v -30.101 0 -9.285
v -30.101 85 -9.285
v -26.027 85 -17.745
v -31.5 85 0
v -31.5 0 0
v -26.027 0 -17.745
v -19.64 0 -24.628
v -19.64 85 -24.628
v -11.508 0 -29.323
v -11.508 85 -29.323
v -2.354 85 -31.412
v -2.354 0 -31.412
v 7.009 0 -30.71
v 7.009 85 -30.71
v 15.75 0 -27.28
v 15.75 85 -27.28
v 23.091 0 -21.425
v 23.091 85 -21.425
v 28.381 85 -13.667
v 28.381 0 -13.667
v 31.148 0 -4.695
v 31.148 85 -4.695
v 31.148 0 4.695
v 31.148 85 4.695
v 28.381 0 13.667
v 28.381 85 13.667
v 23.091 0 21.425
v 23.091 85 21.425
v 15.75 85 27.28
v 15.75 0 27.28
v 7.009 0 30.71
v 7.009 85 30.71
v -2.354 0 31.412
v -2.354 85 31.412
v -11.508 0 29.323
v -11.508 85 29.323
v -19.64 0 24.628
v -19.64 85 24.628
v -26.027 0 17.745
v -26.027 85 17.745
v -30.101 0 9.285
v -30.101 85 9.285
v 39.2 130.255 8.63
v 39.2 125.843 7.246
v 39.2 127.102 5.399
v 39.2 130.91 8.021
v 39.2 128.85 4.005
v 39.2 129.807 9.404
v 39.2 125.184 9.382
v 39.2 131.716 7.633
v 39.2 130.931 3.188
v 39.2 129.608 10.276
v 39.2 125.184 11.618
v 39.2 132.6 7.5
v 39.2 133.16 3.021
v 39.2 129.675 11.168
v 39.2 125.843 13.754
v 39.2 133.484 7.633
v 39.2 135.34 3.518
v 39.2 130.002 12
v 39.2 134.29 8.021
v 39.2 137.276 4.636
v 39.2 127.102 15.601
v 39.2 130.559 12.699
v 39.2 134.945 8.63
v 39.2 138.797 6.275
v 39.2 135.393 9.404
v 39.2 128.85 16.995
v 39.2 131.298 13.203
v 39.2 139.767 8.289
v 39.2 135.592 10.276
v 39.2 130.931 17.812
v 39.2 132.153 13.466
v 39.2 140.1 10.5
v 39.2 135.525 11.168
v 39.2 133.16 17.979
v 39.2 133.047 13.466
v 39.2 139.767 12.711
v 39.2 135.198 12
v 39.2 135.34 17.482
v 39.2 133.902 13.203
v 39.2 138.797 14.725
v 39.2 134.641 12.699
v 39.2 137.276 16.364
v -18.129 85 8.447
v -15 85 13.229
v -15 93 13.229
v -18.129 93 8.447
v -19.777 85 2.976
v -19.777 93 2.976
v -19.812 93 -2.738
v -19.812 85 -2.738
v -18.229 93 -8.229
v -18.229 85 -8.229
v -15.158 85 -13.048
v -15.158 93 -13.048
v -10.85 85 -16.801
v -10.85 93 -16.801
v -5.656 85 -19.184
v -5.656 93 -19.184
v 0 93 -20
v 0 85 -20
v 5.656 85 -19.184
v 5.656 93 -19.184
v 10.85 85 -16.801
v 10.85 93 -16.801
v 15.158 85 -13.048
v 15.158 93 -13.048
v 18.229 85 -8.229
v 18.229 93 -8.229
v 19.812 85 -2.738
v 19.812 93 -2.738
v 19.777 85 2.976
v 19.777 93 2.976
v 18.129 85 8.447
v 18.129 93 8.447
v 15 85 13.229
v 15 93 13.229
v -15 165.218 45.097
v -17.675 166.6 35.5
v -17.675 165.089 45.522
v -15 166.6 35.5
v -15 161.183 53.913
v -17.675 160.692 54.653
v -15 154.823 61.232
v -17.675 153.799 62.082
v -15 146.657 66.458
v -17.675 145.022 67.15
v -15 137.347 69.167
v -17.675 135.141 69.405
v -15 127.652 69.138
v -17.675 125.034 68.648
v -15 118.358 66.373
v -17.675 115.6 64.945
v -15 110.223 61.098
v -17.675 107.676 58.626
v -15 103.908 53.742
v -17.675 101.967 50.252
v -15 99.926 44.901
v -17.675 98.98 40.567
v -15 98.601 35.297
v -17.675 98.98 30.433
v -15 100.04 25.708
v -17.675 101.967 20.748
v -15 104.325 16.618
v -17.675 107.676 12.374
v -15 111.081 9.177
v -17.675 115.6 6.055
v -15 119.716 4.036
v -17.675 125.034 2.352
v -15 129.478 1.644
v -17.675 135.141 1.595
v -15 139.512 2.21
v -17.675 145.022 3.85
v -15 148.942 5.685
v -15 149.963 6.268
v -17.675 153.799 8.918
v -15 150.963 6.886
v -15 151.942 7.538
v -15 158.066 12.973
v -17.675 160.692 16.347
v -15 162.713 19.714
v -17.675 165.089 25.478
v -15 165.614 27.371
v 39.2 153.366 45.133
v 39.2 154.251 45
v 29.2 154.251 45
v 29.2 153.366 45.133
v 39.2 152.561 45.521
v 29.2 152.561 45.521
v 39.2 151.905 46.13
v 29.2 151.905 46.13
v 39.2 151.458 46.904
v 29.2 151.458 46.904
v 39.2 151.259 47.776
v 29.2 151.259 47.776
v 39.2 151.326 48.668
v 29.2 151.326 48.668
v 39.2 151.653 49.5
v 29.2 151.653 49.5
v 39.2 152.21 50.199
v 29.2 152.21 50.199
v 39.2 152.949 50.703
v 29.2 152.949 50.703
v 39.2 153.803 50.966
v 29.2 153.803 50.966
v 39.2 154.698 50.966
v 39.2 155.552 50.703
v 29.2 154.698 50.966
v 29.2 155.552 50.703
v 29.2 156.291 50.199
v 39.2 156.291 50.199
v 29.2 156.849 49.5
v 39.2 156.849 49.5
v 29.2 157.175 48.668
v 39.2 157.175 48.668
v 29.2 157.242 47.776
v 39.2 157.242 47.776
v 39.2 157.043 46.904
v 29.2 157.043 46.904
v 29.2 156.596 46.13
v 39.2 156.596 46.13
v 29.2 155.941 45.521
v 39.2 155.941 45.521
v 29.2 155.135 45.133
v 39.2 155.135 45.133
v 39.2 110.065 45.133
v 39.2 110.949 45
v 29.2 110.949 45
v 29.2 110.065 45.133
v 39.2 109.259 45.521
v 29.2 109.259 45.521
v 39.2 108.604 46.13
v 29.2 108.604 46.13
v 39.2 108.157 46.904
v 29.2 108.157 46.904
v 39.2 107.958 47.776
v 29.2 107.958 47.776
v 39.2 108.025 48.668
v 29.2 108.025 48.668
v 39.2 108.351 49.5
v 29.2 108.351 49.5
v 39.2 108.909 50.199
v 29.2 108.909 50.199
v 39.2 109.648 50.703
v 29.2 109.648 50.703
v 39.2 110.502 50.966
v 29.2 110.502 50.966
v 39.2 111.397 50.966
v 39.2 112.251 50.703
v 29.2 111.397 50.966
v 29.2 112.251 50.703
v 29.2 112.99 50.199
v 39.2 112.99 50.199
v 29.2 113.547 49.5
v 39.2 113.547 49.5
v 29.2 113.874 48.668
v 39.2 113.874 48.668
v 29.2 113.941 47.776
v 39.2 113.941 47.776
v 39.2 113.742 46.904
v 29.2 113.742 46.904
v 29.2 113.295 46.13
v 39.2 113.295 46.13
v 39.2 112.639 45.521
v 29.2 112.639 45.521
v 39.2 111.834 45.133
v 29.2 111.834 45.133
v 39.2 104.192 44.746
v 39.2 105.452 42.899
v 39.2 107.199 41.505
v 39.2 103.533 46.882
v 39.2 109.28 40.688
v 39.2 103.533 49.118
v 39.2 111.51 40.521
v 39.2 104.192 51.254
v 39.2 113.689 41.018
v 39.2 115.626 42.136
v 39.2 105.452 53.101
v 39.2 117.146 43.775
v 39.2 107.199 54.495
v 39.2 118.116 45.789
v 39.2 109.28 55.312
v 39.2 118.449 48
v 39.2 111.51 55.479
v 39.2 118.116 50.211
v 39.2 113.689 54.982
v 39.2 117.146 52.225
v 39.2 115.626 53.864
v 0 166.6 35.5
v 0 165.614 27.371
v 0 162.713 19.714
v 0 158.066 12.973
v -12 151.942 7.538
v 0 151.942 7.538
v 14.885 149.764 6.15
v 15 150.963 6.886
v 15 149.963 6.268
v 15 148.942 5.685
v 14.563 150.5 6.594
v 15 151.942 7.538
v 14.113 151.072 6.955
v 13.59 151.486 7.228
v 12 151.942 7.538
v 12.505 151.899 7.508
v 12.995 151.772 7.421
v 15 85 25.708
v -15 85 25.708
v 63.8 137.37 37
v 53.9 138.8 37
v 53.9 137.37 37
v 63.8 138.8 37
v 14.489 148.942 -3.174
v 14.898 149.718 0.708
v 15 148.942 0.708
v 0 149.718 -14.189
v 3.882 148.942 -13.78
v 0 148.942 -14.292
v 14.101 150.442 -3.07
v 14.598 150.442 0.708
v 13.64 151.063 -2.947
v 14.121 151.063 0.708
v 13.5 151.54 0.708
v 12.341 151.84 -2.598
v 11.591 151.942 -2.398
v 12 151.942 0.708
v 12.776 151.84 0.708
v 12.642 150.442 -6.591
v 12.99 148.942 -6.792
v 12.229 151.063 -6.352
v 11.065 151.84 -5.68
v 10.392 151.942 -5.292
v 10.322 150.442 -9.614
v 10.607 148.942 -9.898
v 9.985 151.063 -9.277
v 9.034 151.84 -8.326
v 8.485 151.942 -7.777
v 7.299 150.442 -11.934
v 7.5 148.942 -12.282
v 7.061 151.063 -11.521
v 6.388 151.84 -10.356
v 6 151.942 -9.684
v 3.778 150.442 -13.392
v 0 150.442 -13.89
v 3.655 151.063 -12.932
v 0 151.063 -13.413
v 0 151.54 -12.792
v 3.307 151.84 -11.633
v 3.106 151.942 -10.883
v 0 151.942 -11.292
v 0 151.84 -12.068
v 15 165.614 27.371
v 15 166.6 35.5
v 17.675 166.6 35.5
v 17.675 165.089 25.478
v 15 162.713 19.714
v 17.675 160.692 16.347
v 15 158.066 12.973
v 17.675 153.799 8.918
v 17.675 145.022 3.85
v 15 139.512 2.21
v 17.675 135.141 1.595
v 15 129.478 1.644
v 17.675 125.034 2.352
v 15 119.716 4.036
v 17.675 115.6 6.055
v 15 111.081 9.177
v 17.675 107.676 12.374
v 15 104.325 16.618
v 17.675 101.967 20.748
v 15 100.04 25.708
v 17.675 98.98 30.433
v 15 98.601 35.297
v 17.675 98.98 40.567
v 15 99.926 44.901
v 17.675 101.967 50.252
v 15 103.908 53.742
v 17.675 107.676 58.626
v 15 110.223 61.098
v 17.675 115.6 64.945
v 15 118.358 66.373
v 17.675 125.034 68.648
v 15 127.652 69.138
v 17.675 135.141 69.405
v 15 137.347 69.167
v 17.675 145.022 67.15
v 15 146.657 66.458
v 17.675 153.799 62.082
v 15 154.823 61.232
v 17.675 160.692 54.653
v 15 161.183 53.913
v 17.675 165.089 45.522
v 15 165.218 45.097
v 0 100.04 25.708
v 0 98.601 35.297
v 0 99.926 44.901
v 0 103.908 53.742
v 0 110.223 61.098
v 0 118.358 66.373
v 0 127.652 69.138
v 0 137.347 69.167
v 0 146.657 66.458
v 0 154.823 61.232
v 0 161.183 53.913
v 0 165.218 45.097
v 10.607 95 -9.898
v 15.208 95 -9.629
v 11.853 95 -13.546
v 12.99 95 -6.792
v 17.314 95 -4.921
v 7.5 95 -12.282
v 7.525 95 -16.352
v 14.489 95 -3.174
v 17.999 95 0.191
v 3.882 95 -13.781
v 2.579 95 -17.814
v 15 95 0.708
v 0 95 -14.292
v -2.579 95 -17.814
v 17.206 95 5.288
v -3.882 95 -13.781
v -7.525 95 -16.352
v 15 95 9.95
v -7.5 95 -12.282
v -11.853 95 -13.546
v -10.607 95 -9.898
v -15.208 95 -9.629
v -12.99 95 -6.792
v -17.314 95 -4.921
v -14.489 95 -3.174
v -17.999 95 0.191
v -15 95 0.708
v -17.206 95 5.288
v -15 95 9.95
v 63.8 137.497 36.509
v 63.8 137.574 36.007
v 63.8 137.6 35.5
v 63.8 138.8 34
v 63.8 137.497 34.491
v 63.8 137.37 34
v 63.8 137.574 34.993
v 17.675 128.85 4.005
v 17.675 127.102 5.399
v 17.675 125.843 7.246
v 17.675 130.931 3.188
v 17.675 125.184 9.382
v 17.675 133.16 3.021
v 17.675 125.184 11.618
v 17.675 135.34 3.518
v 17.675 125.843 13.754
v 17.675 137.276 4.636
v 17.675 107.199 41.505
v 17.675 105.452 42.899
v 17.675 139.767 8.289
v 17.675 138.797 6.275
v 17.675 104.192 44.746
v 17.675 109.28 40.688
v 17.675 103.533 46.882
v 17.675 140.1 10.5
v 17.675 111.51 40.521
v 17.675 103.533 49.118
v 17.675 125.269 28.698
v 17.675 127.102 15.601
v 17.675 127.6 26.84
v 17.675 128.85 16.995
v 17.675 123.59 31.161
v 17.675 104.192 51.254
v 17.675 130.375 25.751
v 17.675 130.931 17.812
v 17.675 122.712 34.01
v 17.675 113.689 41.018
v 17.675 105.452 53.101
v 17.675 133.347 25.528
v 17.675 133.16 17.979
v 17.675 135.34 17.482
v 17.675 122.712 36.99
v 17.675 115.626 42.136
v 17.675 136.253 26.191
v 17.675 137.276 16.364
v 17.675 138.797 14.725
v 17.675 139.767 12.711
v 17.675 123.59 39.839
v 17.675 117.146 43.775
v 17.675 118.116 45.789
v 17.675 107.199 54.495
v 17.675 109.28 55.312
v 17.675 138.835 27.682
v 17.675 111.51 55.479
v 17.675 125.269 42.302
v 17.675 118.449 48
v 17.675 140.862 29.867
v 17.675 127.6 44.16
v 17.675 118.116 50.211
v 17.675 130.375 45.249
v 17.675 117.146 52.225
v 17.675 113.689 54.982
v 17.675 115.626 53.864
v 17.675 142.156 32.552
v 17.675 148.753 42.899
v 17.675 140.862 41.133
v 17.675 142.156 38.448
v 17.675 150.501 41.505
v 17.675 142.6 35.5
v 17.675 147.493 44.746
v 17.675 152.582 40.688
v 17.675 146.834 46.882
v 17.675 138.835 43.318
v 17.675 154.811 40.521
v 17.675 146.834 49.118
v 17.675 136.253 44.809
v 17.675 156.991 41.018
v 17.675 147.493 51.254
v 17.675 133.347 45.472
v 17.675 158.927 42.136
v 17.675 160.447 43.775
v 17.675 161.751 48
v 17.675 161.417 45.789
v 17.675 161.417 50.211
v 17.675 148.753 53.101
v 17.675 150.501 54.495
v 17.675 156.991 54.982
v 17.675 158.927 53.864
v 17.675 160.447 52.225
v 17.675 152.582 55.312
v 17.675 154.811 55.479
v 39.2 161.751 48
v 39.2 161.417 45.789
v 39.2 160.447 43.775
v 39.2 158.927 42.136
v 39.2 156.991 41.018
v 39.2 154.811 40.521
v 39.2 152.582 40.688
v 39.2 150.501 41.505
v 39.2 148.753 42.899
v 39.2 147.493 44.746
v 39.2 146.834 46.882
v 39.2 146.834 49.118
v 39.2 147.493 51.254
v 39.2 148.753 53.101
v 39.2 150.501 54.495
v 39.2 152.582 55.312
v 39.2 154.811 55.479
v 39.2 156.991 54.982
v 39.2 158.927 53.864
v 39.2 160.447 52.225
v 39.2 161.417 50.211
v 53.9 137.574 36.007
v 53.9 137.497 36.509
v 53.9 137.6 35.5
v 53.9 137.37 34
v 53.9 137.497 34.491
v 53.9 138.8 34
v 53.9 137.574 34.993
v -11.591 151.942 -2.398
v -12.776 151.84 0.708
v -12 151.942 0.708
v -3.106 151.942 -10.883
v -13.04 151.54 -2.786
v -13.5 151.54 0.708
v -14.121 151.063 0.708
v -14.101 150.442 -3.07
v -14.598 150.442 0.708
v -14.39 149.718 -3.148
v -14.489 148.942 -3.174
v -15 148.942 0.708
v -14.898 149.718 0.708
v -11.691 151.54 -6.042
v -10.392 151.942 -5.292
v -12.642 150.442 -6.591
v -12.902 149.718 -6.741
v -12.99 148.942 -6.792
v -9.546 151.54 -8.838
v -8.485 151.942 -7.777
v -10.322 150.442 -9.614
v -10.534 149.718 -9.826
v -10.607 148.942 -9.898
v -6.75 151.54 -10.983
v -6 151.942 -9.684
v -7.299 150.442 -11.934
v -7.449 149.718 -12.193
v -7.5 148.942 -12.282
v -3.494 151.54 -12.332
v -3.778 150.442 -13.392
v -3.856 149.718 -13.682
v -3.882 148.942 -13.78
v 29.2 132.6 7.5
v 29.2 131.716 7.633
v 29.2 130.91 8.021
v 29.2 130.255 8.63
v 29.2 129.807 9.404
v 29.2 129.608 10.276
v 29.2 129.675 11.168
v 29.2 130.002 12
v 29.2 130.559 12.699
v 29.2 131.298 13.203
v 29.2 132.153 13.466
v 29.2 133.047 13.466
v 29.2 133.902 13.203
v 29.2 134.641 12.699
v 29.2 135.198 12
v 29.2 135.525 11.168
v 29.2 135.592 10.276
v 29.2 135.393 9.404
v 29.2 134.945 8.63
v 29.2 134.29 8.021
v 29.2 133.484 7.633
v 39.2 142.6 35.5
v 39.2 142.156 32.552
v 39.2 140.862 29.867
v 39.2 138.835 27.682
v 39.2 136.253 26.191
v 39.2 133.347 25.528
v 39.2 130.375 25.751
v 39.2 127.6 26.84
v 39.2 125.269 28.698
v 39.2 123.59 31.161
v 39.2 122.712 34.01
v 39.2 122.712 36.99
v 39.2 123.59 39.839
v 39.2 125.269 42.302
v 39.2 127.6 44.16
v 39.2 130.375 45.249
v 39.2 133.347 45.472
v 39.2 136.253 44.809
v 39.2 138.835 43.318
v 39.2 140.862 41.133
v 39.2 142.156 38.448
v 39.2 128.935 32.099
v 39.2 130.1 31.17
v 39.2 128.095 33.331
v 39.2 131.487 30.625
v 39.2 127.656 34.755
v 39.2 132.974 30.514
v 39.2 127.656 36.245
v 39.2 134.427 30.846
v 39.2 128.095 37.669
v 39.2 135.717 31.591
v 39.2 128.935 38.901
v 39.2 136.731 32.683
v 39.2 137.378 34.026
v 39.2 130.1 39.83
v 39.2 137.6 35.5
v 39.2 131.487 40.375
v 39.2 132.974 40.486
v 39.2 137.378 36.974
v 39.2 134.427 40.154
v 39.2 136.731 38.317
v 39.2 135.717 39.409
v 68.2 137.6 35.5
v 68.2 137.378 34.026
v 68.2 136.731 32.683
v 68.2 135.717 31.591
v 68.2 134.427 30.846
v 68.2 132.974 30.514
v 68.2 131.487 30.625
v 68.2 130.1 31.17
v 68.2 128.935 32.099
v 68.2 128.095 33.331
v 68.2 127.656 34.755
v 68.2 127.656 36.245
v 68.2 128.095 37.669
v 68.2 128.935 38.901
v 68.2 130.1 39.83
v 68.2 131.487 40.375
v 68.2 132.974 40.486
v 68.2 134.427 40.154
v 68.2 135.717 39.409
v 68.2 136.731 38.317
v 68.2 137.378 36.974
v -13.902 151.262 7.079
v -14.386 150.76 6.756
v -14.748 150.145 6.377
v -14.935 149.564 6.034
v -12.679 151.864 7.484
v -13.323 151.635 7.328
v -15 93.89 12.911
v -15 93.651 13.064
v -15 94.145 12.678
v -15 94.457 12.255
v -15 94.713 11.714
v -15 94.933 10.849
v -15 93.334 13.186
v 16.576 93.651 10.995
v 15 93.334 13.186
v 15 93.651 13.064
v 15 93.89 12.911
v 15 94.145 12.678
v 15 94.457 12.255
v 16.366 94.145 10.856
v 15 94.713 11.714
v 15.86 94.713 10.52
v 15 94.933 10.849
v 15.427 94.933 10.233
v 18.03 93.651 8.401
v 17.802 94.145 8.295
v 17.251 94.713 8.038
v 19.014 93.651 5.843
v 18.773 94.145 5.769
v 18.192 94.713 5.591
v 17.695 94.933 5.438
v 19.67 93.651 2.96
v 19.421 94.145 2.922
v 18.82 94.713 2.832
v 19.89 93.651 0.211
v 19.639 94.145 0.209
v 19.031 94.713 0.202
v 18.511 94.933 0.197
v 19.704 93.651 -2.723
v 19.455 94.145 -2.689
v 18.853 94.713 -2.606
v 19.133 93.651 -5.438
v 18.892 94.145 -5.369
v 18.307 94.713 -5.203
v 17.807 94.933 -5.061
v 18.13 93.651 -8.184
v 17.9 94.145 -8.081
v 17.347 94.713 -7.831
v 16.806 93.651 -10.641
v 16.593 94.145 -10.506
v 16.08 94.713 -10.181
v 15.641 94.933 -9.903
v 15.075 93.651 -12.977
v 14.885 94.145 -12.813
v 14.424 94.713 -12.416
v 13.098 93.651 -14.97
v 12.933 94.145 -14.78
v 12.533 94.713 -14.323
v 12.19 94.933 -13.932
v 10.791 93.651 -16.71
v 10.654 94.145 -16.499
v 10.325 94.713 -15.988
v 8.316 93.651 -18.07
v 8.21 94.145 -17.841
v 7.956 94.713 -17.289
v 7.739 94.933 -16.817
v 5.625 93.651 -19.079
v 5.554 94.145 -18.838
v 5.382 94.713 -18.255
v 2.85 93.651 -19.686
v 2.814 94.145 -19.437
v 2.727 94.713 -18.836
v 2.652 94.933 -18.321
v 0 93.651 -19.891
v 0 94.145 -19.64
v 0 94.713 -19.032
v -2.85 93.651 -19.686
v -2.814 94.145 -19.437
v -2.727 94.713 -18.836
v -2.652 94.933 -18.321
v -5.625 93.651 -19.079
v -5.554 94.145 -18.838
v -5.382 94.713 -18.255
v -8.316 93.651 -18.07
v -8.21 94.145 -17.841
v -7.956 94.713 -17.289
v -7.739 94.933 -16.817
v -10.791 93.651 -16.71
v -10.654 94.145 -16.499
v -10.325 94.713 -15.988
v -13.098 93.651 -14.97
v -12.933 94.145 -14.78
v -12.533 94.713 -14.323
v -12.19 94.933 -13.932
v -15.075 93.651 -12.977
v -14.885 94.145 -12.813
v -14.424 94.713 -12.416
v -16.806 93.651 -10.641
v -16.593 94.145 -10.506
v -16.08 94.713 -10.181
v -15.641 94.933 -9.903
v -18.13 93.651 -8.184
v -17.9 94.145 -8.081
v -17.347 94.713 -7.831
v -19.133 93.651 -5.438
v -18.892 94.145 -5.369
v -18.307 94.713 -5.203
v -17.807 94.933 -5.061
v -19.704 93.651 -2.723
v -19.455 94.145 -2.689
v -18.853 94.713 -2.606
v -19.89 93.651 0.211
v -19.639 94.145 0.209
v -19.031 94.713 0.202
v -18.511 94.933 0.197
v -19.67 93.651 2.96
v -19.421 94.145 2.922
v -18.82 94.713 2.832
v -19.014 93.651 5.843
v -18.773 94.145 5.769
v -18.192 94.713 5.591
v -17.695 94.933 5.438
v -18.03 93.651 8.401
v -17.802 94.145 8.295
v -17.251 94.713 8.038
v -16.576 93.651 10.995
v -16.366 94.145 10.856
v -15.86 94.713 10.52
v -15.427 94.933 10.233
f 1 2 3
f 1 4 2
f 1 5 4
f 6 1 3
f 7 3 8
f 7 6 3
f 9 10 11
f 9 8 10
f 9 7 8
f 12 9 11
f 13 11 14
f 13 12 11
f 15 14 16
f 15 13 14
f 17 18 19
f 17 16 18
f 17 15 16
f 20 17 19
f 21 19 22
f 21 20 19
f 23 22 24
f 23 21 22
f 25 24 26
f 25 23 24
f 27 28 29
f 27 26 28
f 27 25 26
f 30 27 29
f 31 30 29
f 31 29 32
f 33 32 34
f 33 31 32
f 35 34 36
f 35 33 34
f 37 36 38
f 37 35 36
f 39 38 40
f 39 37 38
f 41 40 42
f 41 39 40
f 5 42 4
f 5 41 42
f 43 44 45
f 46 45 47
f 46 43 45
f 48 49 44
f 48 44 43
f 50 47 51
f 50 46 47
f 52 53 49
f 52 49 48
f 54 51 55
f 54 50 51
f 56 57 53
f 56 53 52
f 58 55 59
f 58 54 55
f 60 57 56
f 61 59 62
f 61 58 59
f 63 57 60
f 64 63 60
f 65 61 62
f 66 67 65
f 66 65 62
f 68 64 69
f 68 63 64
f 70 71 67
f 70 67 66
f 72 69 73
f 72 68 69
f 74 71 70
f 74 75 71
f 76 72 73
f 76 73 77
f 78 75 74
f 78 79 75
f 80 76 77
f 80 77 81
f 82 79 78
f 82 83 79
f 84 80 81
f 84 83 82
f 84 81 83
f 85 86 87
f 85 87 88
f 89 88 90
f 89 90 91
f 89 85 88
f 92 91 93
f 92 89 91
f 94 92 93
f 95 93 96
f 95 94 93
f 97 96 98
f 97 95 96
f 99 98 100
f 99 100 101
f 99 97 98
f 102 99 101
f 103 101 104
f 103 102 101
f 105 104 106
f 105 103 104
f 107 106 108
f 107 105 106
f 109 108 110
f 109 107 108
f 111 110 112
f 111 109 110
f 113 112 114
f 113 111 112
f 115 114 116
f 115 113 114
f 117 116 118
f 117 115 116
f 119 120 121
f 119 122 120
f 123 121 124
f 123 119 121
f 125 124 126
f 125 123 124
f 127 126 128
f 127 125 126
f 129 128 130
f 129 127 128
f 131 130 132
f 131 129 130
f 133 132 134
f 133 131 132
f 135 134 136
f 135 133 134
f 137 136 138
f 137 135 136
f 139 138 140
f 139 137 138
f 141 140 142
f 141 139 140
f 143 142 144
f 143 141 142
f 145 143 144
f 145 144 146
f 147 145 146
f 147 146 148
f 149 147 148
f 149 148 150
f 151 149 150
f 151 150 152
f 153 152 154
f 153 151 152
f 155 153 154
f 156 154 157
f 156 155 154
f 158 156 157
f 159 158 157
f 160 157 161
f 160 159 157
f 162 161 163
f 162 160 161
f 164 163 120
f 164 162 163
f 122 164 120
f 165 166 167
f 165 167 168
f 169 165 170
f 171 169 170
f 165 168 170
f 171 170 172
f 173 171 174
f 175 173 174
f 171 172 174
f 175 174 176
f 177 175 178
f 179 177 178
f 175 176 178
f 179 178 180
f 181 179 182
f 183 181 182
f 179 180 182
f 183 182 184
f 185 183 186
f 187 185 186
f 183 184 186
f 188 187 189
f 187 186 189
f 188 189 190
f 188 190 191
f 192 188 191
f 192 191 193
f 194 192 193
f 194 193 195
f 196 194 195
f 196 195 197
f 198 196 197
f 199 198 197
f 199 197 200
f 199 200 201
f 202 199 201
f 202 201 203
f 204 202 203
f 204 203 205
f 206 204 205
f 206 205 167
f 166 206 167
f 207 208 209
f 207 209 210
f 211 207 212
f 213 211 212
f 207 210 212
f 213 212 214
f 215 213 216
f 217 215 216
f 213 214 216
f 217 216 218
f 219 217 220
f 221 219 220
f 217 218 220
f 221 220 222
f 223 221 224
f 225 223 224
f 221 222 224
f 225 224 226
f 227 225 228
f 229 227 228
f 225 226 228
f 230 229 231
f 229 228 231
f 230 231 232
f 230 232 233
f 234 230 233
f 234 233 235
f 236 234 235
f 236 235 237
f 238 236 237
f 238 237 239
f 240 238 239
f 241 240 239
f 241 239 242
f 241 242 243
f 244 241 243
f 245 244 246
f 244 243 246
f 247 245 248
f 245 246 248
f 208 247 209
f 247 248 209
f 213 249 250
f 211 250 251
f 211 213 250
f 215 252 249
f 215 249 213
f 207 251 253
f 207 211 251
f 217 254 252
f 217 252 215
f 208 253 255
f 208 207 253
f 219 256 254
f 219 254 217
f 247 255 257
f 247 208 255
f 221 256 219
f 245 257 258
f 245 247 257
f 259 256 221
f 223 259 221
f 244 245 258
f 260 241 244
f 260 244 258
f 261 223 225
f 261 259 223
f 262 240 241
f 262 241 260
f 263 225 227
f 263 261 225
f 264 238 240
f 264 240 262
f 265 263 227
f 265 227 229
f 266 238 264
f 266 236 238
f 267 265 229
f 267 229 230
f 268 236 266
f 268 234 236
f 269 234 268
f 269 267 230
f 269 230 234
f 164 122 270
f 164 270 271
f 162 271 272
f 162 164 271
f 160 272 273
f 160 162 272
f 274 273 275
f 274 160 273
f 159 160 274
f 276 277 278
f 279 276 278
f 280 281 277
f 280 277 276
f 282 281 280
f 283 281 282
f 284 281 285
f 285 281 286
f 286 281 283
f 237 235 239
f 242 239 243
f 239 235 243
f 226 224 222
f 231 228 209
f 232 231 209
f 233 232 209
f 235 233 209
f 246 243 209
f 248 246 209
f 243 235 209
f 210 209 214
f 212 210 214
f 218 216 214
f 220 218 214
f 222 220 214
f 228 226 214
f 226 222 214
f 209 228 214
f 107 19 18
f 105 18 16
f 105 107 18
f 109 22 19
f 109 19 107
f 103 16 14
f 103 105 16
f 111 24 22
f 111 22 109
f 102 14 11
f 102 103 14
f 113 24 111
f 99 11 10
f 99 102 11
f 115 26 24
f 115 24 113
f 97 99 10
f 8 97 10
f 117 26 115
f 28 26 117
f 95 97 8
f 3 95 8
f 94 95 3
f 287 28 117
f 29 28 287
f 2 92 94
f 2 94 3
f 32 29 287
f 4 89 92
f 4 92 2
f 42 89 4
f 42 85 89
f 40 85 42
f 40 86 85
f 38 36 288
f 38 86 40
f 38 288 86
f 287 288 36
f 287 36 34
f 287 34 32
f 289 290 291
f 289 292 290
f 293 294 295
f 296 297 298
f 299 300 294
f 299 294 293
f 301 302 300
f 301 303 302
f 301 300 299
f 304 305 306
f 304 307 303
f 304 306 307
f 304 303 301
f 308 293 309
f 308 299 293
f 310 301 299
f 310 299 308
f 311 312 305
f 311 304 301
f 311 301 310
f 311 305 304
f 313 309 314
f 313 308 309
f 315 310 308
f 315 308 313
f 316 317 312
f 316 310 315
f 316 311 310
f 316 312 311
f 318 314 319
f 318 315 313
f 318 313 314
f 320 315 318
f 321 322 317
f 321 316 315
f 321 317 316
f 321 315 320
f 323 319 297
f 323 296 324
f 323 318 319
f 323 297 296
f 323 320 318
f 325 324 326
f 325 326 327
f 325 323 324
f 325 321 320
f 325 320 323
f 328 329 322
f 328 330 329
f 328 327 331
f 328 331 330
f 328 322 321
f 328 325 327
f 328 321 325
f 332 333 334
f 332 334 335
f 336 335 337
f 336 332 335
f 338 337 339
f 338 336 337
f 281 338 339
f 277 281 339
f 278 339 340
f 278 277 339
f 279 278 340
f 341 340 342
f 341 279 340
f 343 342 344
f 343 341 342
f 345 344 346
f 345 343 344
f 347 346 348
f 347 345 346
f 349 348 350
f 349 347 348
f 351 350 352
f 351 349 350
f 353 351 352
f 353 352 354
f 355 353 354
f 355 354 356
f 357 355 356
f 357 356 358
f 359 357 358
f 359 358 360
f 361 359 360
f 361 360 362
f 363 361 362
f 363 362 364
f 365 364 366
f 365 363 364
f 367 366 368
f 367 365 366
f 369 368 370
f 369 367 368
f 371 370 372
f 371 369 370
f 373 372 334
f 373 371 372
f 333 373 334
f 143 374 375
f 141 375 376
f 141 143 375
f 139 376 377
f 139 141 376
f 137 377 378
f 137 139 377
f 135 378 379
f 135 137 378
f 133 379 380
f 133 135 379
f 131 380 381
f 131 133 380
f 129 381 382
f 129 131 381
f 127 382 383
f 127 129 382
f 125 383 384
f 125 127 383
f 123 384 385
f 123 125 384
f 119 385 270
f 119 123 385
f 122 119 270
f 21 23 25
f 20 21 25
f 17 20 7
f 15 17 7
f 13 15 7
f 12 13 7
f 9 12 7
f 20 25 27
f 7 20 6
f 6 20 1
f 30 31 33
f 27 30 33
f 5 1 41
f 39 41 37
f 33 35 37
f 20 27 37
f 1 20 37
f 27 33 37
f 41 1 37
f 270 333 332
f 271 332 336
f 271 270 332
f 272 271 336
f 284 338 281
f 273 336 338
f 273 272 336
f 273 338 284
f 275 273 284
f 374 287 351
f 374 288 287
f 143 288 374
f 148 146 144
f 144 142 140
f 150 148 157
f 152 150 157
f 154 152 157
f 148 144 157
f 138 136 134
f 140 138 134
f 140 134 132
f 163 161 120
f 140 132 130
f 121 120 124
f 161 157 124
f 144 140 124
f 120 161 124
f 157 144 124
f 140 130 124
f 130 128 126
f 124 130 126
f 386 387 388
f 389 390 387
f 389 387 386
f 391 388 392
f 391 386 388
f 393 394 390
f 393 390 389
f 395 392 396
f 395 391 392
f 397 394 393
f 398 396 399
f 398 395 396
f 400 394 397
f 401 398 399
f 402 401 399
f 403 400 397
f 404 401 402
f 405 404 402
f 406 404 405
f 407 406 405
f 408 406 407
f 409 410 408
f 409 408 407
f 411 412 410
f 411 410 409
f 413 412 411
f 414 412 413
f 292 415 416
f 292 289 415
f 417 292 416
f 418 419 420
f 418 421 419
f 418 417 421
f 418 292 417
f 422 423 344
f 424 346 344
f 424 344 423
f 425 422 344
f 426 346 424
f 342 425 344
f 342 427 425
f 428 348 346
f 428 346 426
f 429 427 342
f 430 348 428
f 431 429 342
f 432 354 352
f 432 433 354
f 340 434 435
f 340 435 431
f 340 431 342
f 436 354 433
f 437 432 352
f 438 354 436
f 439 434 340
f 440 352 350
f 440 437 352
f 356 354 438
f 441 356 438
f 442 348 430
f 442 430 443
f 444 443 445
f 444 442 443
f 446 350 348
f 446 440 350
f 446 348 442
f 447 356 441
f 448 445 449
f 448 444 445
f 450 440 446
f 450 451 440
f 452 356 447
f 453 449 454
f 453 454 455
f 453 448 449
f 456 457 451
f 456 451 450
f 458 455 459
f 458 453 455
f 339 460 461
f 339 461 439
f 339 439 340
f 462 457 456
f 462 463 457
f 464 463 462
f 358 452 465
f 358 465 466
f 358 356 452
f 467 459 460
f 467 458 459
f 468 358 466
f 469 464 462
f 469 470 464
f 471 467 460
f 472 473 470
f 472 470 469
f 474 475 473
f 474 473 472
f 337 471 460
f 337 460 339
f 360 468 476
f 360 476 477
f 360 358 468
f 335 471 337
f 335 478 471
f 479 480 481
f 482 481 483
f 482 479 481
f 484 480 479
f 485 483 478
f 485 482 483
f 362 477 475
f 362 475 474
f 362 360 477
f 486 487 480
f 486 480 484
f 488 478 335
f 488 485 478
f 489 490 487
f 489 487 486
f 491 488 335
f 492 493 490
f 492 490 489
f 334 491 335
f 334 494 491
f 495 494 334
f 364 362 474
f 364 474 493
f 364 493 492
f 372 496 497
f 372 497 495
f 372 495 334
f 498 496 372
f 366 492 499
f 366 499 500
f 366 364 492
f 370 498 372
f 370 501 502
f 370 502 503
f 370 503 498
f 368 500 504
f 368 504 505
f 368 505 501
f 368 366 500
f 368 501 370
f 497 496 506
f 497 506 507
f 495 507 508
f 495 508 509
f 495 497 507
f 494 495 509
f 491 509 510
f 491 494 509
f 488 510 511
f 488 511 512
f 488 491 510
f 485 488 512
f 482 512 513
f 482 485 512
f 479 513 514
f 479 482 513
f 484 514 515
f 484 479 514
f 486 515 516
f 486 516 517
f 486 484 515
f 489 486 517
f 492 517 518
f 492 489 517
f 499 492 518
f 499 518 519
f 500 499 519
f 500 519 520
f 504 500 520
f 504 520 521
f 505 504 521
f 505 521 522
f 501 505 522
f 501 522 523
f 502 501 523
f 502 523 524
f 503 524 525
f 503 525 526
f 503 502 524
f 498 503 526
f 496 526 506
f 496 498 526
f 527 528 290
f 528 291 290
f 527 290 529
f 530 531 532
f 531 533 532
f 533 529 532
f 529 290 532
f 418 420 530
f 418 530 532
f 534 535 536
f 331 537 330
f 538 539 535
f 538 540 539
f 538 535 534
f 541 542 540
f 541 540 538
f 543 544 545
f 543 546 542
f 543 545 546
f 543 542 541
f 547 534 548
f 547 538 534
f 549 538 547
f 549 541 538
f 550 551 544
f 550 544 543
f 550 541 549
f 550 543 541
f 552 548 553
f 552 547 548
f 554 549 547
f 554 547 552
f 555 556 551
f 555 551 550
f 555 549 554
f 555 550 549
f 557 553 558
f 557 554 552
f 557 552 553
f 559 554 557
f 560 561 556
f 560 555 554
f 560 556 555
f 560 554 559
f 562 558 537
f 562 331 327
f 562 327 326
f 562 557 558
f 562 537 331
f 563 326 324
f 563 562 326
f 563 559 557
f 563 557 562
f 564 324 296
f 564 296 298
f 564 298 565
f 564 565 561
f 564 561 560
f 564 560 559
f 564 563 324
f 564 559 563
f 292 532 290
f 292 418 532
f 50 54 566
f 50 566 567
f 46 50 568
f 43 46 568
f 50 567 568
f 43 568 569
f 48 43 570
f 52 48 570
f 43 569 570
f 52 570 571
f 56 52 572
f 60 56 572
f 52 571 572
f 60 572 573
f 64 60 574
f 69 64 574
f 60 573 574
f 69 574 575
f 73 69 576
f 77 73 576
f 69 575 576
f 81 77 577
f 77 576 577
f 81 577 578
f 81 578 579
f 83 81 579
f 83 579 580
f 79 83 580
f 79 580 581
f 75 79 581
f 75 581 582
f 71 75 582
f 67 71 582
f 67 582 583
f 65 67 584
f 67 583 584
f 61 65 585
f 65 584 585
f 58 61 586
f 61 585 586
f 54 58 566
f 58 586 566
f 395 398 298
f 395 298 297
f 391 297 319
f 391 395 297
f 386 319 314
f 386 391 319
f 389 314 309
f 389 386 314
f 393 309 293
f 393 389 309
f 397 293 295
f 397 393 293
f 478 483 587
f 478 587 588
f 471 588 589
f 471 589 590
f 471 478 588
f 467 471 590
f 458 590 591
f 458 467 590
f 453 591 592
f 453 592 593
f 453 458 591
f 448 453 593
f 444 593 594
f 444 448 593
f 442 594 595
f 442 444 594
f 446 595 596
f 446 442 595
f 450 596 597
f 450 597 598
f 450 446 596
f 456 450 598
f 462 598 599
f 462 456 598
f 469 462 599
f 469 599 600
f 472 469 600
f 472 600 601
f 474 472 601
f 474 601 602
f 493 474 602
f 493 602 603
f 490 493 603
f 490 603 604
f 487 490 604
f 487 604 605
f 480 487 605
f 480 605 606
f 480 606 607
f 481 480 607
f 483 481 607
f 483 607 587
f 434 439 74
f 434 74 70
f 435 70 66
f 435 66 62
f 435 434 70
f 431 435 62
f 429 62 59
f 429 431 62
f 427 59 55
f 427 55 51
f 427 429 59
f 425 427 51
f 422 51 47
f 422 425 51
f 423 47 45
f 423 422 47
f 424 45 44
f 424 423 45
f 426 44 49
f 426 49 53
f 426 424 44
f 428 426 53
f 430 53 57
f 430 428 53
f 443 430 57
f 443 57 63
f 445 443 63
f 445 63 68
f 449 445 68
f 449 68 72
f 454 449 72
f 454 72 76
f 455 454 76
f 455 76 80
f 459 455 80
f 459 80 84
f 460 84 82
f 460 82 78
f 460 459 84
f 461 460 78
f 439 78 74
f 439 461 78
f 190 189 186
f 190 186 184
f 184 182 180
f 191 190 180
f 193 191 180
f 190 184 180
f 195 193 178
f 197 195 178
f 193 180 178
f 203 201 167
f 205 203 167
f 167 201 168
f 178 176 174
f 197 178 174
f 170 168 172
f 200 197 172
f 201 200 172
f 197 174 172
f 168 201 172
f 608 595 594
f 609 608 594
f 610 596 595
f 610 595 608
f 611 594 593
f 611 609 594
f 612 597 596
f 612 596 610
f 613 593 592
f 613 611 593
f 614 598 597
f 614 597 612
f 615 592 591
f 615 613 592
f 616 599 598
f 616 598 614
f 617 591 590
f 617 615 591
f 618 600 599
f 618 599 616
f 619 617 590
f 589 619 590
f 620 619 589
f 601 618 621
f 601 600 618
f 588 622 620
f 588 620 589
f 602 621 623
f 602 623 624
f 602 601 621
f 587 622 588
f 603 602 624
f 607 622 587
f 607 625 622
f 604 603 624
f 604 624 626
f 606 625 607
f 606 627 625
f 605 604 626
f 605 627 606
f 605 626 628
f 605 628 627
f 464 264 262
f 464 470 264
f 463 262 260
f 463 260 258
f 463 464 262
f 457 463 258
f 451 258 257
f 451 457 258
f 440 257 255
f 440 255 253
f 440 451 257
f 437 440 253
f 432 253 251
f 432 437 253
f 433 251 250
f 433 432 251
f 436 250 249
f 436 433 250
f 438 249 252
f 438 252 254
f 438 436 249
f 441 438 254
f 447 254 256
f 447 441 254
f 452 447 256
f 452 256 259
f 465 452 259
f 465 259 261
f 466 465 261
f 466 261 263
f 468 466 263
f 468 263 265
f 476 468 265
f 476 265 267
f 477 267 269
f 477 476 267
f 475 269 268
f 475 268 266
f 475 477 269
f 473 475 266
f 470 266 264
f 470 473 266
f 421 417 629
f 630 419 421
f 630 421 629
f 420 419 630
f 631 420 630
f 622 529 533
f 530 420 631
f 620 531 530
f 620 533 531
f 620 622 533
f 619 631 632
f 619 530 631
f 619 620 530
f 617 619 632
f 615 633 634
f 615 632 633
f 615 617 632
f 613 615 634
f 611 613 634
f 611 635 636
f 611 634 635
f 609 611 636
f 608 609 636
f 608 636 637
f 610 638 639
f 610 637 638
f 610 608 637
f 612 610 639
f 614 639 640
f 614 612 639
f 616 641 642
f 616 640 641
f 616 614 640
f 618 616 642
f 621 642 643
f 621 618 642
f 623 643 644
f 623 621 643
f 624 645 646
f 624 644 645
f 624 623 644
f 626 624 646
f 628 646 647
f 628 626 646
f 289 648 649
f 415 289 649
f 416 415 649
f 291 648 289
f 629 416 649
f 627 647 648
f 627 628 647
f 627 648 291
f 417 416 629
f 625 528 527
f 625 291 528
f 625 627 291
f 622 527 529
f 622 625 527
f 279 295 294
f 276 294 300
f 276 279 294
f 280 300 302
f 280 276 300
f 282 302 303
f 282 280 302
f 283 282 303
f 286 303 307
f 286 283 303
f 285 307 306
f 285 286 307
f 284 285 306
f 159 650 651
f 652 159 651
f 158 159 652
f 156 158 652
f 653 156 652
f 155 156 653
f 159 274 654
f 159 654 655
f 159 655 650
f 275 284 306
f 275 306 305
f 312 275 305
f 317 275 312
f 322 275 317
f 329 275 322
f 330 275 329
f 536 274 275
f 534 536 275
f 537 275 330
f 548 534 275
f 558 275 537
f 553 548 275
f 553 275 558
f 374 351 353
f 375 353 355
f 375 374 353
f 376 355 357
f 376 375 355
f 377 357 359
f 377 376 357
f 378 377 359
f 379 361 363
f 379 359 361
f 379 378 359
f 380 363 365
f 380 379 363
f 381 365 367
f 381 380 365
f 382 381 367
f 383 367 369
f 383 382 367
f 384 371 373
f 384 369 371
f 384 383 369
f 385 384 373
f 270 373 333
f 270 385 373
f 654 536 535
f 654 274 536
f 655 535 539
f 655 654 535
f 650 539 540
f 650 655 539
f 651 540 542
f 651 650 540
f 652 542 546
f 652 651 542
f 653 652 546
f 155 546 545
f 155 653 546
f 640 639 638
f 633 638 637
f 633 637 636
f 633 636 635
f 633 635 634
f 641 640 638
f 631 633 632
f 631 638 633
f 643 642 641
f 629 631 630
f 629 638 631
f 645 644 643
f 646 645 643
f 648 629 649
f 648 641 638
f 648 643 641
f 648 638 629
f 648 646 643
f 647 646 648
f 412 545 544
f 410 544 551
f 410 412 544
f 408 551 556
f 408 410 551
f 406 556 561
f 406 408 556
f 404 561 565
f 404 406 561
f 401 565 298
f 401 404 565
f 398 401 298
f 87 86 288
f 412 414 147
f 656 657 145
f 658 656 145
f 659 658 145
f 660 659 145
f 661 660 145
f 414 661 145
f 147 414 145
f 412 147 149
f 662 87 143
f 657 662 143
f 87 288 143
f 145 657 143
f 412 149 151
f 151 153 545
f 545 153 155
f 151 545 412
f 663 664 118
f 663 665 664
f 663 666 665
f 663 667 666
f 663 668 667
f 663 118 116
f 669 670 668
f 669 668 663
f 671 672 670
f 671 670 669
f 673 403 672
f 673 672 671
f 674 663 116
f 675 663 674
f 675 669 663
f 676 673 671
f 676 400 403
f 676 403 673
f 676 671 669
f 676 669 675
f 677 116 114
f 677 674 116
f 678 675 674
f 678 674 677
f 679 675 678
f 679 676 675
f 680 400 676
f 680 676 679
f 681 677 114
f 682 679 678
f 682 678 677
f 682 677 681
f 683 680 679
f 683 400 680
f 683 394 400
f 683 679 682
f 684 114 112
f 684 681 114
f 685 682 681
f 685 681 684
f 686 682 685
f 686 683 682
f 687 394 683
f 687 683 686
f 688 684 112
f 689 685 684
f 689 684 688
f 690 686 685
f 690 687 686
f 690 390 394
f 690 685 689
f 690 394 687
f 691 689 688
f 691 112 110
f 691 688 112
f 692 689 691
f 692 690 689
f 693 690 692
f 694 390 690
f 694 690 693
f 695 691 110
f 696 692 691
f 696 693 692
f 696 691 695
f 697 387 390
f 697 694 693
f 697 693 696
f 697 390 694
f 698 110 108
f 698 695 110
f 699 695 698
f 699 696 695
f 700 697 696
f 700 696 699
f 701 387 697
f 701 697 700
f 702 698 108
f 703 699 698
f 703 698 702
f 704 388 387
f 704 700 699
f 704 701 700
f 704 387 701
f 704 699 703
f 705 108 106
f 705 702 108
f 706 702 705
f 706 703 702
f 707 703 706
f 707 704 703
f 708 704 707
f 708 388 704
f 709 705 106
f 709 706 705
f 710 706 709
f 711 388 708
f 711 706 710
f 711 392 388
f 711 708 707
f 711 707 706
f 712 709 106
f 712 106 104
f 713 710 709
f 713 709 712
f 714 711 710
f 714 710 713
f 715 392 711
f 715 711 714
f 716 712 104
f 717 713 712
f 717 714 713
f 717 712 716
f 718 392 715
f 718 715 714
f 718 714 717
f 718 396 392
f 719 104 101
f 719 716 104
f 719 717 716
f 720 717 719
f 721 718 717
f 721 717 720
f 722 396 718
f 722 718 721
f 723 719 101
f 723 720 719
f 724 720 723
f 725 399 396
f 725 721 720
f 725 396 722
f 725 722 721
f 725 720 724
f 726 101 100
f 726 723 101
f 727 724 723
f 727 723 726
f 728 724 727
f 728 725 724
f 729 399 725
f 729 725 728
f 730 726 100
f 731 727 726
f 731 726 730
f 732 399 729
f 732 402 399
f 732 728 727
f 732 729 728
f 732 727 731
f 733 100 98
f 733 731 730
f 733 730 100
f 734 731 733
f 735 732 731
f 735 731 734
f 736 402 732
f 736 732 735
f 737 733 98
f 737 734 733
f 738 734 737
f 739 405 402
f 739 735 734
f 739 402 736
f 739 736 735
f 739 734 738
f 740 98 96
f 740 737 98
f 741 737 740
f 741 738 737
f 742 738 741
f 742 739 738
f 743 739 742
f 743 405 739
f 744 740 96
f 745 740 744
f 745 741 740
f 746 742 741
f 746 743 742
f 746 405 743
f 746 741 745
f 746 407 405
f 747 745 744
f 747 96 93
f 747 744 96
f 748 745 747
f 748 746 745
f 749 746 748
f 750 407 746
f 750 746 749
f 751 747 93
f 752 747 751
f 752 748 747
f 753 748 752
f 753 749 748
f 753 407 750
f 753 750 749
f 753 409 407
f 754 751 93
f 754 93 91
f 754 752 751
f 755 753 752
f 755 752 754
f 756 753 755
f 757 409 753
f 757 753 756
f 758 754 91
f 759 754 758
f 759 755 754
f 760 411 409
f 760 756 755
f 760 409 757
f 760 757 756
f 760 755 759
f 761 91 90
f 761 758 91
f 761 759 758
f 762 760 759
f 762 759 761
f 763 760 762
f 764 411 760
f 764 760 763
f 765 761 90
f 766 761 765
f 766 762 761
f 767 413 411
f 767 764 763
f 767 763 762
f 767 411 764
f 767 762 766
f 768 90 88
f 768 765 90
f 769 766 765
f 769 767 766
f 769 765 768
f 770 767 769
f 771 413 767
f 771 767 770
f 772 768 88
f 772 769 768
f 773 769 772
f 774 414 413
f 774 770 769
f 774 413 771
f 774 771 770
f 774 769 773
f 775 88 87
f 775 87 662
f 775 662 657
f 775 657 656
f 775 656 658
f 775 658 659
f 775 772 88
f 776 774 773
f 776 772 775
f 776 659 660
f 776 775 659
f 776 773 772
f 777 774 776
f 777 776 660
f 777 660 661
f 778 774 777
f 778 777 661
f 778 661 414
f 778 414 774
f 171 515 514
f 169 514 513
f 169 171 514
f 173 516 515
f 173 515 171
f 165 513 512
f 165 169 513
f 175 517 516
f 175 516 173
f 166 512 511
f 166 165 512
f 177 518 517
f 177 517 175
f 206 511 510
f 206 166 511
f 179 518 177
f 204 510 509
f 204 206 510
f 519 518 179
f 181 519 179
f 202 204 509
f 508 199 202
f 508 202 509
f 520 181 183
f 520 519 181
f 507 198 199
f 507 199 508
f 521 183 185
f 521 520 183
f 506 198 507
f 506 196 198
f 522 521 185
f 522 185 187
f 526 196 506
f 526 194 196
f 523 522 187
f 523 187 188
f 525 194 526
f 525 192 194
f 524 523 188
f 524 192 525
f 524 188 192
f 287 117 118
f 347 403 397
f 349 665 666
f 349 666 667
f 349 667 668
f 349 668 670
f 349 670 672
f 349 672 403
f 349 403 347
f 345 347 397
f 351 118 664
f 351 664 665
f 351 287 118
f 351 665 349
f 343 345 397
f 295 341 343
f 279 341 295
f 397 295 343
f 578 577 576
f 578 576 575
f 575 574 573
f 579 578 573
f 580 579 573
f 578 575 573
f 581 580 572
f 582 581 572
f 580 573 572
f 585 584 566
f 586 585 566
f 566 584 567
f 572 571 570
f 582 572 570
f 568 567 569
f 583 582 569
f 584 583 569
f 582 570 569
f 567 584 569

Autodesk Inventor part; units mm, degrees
ref_plane "XZ Plane" through (0, 0, 0) normal (0, 1, 0) x (-1, 0, 0)
sketch "Sketch1" plane through (0, 0, 0) normal (0, 1, 0) x (-1, 0, 0)
  circle A0 centre (0, 0) radius 31.5
  circle A1 centre (0, 0) radius 20
  dimension "d0" = 63
  dimension "d29" = 40
extrude "Extrusion1" add sketch "Sketch1" along normal blind 85 contours A0 | A1
sketch "Sketch2" plane through (0, 0, 0) normal (1, 0, 0) x (0, 1, 0)
  line L0 (0, -31.5) -> (85, -31.5) projected
  line L1 (0, -31.5) -> (0, 69.5)
  line L2 (0, 69.5) -> (166.6, 69.5)
  line L3 (166.6, 69.5) -> (166.6, 35.5)
  line L4 (166.6, 35.5) -> (132.6, 35.5)
  circle A0 centre (132.6, 35.5) radius 34
  circle A1 centre (132.6, 35.5) radius 25
  circle A2 centre (132.6, 10.5) radius 7.5
  circle A3 centre (132.6, 10.5) radius 3
  circle A4 centre (154.2506, 48) radius 7.5
  circle A5 centre (154.2506, 48) radius 3
  circle A6 centre (110.9494, 48) radius 7.5
  circle A7 centre (110.9494, 48) radius 3
  line L5 (85, -31.5) -> (85, 31.5) projected
  line L6 (85, 25.7084) -> (151.9419, 25.7084)
  line L7 (151.9419, 25.7084) -> (151.9419, -14.2916)
  line L8 (151.9419, -14.2916) -> (85, -14.2916)
  line L9 (85, -14.2916) -> (85, 25.7084)
  circle A8 centre (132.6, 35.5) radius 10
  circle A9 centre (132.6, 35.5) radius 5
  line L10 (85, 31.5) -> (85, 0)
  line L11 (85, 0) -> (100.814, 0)
  point P0 (0, 0)
  point P1 (151.9419, 7.5377)
  point P2 (134.9384, 1.5805)
  point P3 (132.6, 1.5)
  point P4 (100.0404, 25.7084)
  point P5 (92.907, 0)
  dimension "d8" = 50
  dimension "d3" = 101
  dimension "d4" = 166.6
  dimension "d5" = 34
  dimension "d6" = 34
  dimension "d7" = 68
  dimension "d9" = 15
  dimension "d10" = 6
  dimension "d13" = 360
  dimension "d21" = 20
  dimension "d22" = 10
  dimension "d26" = 40
  dimension "d49" = 69.5
  dimension "d50" = 35.5
extrude "Extrusion2" add sketch "Sketch2" along normal mid plane 30 contours L5 L6 A0 L7 L8 | A0 L4 A1 A4 A6 L6 | A0 L7 A1 L4 | L6 A1 A2 L7 A0 | A1 L7 L6 A8 L4 | L4 A8 L6 A1 A6 A4 | L6 A8 L7 A1 A2 | A8 L6 | A4 A1 A5 | A1 A5 A4 | A6 A1 A7 | A1 A7 A6 | L6 A8 | A5 A1 | A1 A5 | A7 A1 | A1 A7 | A9
extrude "Extrusion3" add sketch "Sketch2" along normal blind 39.2 contours A8 L6 | A4 A1 A5 | A1 A5 A4 | A6 A1 A7 | A1 A7 A6 | A2 A1 A3 | A1 A3 A2 | L6 A8 | A5 A1 | A1 A5 | A7 A1 | A1 A7 | A3 A1 | A1 A3 | A9
extrude "Extrusion4" add sketch "Sketch2" along normal mid plane 35.35 contours A0 L4 A1 A4 A6 L6 | A0 L7 A1 L4 | L6 A1 A2 L7 A0 | A1 L7 L6 A8 L4 | L4 A8 L6 A1 A6 A4 | L6 A8 L7 A1 A2 | A8 L6 | A4 A1 A5 | A1 A5 A4 | A6 A1 A7 | A1 A7 A6 | A2 A1 A3 | A1 A3 A2 | L6 A8 | A5 A1 | A1 A5 | A7 A1 | A1 A7 | A3 A1 | A1 A3 | A9
extrude "Extrusion5" add sketch "Sketch2" along normal blind 68.2 contours A9
ref_plane "Work Plane1" through (-31.5, 0, 0) normal (1, 0, 0) x (0, 1, 0)
fillet "Fillet1" radius 15 2 edges at (15, 118.471, -14.2916) (-15, 118.471, -14.2916)
fillet "Fillet2" radius 3 3 edges at (15, 151.9419, 4.123) (-15, 151.9419, 4.123) (10.6066, 151.9419, -9.8982)
extrude "Extrusion6" add sketch "Sketch1" along normal blind 95 contours A1
fillet "Fillet3" radius 2 1 edges at (0, 95, -20)
ref_plane "Work Plane2" through (63.8, 132.6, 35.5) normal (1, 0, 0) x (0, 0, -1)
sketch "Sketch3" plane through (39.2, 154.2506, 48) normal (1, 0, 0) x (0, 0, -1)
  circle A0 centre (0, 0) radius 3
  circle A1 centre (37.5, -21.6506) radius 7.5 projected
  circle A2 centre (37.5, -21.6506) radius 3
  circle A3 centre (0, -43.3013) radius 7.5 projected
  circle A4 centre (0, -43.3013) radius 3
  point P0 (48, -154.2506)
  dimension "d33" = 6
  dimension "d34" = 6
  dimension "d35" = 6
hole "Hole1" at (39.2, 154.2506, 48) at (39.2, 132.6, 10.5) at (39.2, 110.9494, 48) direction (-1, 0, 0) diameter 6 depth 10
sketch "Sketch4" plane through (63.8, 132.6, 35.5) normal (1, 0, 0) x (0, 0, -1)
  line L0 (-1.5, 3.8) -> (1.5, 3.8)
  line L1 (1.5, 3.8) -> (1.5, 6.2)
  line L2 (1.5, 6.2) -> (-1.5, 6.2)
  line L3 (-1.5, 6.2) -> (-1.5, 3.8)
  circle A0 centre (0, 0) radius 5 projected
  line L4 (-1.5, 3.8) -> (1.5, 6.2) construction
  line L5 (1.5, 3.8) -> (-1.5, 6.2) construction
  point P0 (35.5, -132.6)
  point P1 (0, 5)
  point P2 (-1.5, 4.7697)
  point P3 (1.5, 4.7697)
  dimension "d43" = 1.2
  dimension "d44" = 3
extrude "Extrusion7" add sketch "Sketch4" against normal blind 9.9 contours L3 L2 L1 A0
ref_plane "Work Plane3" through (0, 0, -31.5) normal (0, 0, 1) x (1, 0, 0)
properties part number "motor" material "ABS Plastic"
